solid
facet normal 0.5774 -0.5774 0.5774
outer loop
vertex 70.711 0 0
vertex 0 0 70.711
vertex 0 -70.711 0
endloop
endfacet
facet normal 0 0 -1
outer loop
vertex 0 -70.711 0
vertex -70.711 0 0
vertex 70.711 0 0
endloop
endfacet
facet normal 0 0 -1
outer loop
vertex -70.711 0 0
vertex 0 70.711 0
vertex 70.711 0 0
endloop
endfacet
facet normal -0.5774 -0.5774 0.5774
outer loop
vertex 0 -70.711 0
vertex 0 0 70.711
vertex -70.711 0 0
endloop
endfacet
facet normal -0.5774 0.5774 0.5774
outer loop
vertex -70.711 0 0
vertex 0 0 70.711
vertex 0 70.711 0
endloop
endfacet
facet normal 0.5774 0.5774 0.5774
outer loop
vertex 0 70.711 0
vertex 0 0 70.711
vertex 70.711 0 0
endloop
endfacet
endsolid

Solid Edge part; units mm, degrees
sketch "Sketch1" plane through (0, 0, 0) normal (0, 0, 1) x (1, 0, 0)
  line L0 (0, -70.7107) -> (70.7107, 0)
  line L1 (70.7107, 0) -> (0, 70.7107)
  line L2 (0, 70.7107) -> (-70.7107, 0)
  line L3 (-70.7107, 0) -> (0, -70.7107)
extrude "Protrusion1" add sketch "Sketch1" along normal up to vertex (70.7107 mm away)
sketch "Sketch2" plane through (-35.3553, -35.3553, 35.3553) normal (-0.7071, -0.7071, 0) x (0.7071, -0.7071, 0)
  line L0 (0, 35.3553) -> (50, -35.3553)
extrude "Cutout1" cut sketch "Sketch2" against normal up to next material side at (-17.6488, -53.0618, 35.3842)
pattern_circular "Pattern1" count 4 over 360 about axis through (0, 0, 70.7107) along (0, 0, -1) of "Cutout1"
